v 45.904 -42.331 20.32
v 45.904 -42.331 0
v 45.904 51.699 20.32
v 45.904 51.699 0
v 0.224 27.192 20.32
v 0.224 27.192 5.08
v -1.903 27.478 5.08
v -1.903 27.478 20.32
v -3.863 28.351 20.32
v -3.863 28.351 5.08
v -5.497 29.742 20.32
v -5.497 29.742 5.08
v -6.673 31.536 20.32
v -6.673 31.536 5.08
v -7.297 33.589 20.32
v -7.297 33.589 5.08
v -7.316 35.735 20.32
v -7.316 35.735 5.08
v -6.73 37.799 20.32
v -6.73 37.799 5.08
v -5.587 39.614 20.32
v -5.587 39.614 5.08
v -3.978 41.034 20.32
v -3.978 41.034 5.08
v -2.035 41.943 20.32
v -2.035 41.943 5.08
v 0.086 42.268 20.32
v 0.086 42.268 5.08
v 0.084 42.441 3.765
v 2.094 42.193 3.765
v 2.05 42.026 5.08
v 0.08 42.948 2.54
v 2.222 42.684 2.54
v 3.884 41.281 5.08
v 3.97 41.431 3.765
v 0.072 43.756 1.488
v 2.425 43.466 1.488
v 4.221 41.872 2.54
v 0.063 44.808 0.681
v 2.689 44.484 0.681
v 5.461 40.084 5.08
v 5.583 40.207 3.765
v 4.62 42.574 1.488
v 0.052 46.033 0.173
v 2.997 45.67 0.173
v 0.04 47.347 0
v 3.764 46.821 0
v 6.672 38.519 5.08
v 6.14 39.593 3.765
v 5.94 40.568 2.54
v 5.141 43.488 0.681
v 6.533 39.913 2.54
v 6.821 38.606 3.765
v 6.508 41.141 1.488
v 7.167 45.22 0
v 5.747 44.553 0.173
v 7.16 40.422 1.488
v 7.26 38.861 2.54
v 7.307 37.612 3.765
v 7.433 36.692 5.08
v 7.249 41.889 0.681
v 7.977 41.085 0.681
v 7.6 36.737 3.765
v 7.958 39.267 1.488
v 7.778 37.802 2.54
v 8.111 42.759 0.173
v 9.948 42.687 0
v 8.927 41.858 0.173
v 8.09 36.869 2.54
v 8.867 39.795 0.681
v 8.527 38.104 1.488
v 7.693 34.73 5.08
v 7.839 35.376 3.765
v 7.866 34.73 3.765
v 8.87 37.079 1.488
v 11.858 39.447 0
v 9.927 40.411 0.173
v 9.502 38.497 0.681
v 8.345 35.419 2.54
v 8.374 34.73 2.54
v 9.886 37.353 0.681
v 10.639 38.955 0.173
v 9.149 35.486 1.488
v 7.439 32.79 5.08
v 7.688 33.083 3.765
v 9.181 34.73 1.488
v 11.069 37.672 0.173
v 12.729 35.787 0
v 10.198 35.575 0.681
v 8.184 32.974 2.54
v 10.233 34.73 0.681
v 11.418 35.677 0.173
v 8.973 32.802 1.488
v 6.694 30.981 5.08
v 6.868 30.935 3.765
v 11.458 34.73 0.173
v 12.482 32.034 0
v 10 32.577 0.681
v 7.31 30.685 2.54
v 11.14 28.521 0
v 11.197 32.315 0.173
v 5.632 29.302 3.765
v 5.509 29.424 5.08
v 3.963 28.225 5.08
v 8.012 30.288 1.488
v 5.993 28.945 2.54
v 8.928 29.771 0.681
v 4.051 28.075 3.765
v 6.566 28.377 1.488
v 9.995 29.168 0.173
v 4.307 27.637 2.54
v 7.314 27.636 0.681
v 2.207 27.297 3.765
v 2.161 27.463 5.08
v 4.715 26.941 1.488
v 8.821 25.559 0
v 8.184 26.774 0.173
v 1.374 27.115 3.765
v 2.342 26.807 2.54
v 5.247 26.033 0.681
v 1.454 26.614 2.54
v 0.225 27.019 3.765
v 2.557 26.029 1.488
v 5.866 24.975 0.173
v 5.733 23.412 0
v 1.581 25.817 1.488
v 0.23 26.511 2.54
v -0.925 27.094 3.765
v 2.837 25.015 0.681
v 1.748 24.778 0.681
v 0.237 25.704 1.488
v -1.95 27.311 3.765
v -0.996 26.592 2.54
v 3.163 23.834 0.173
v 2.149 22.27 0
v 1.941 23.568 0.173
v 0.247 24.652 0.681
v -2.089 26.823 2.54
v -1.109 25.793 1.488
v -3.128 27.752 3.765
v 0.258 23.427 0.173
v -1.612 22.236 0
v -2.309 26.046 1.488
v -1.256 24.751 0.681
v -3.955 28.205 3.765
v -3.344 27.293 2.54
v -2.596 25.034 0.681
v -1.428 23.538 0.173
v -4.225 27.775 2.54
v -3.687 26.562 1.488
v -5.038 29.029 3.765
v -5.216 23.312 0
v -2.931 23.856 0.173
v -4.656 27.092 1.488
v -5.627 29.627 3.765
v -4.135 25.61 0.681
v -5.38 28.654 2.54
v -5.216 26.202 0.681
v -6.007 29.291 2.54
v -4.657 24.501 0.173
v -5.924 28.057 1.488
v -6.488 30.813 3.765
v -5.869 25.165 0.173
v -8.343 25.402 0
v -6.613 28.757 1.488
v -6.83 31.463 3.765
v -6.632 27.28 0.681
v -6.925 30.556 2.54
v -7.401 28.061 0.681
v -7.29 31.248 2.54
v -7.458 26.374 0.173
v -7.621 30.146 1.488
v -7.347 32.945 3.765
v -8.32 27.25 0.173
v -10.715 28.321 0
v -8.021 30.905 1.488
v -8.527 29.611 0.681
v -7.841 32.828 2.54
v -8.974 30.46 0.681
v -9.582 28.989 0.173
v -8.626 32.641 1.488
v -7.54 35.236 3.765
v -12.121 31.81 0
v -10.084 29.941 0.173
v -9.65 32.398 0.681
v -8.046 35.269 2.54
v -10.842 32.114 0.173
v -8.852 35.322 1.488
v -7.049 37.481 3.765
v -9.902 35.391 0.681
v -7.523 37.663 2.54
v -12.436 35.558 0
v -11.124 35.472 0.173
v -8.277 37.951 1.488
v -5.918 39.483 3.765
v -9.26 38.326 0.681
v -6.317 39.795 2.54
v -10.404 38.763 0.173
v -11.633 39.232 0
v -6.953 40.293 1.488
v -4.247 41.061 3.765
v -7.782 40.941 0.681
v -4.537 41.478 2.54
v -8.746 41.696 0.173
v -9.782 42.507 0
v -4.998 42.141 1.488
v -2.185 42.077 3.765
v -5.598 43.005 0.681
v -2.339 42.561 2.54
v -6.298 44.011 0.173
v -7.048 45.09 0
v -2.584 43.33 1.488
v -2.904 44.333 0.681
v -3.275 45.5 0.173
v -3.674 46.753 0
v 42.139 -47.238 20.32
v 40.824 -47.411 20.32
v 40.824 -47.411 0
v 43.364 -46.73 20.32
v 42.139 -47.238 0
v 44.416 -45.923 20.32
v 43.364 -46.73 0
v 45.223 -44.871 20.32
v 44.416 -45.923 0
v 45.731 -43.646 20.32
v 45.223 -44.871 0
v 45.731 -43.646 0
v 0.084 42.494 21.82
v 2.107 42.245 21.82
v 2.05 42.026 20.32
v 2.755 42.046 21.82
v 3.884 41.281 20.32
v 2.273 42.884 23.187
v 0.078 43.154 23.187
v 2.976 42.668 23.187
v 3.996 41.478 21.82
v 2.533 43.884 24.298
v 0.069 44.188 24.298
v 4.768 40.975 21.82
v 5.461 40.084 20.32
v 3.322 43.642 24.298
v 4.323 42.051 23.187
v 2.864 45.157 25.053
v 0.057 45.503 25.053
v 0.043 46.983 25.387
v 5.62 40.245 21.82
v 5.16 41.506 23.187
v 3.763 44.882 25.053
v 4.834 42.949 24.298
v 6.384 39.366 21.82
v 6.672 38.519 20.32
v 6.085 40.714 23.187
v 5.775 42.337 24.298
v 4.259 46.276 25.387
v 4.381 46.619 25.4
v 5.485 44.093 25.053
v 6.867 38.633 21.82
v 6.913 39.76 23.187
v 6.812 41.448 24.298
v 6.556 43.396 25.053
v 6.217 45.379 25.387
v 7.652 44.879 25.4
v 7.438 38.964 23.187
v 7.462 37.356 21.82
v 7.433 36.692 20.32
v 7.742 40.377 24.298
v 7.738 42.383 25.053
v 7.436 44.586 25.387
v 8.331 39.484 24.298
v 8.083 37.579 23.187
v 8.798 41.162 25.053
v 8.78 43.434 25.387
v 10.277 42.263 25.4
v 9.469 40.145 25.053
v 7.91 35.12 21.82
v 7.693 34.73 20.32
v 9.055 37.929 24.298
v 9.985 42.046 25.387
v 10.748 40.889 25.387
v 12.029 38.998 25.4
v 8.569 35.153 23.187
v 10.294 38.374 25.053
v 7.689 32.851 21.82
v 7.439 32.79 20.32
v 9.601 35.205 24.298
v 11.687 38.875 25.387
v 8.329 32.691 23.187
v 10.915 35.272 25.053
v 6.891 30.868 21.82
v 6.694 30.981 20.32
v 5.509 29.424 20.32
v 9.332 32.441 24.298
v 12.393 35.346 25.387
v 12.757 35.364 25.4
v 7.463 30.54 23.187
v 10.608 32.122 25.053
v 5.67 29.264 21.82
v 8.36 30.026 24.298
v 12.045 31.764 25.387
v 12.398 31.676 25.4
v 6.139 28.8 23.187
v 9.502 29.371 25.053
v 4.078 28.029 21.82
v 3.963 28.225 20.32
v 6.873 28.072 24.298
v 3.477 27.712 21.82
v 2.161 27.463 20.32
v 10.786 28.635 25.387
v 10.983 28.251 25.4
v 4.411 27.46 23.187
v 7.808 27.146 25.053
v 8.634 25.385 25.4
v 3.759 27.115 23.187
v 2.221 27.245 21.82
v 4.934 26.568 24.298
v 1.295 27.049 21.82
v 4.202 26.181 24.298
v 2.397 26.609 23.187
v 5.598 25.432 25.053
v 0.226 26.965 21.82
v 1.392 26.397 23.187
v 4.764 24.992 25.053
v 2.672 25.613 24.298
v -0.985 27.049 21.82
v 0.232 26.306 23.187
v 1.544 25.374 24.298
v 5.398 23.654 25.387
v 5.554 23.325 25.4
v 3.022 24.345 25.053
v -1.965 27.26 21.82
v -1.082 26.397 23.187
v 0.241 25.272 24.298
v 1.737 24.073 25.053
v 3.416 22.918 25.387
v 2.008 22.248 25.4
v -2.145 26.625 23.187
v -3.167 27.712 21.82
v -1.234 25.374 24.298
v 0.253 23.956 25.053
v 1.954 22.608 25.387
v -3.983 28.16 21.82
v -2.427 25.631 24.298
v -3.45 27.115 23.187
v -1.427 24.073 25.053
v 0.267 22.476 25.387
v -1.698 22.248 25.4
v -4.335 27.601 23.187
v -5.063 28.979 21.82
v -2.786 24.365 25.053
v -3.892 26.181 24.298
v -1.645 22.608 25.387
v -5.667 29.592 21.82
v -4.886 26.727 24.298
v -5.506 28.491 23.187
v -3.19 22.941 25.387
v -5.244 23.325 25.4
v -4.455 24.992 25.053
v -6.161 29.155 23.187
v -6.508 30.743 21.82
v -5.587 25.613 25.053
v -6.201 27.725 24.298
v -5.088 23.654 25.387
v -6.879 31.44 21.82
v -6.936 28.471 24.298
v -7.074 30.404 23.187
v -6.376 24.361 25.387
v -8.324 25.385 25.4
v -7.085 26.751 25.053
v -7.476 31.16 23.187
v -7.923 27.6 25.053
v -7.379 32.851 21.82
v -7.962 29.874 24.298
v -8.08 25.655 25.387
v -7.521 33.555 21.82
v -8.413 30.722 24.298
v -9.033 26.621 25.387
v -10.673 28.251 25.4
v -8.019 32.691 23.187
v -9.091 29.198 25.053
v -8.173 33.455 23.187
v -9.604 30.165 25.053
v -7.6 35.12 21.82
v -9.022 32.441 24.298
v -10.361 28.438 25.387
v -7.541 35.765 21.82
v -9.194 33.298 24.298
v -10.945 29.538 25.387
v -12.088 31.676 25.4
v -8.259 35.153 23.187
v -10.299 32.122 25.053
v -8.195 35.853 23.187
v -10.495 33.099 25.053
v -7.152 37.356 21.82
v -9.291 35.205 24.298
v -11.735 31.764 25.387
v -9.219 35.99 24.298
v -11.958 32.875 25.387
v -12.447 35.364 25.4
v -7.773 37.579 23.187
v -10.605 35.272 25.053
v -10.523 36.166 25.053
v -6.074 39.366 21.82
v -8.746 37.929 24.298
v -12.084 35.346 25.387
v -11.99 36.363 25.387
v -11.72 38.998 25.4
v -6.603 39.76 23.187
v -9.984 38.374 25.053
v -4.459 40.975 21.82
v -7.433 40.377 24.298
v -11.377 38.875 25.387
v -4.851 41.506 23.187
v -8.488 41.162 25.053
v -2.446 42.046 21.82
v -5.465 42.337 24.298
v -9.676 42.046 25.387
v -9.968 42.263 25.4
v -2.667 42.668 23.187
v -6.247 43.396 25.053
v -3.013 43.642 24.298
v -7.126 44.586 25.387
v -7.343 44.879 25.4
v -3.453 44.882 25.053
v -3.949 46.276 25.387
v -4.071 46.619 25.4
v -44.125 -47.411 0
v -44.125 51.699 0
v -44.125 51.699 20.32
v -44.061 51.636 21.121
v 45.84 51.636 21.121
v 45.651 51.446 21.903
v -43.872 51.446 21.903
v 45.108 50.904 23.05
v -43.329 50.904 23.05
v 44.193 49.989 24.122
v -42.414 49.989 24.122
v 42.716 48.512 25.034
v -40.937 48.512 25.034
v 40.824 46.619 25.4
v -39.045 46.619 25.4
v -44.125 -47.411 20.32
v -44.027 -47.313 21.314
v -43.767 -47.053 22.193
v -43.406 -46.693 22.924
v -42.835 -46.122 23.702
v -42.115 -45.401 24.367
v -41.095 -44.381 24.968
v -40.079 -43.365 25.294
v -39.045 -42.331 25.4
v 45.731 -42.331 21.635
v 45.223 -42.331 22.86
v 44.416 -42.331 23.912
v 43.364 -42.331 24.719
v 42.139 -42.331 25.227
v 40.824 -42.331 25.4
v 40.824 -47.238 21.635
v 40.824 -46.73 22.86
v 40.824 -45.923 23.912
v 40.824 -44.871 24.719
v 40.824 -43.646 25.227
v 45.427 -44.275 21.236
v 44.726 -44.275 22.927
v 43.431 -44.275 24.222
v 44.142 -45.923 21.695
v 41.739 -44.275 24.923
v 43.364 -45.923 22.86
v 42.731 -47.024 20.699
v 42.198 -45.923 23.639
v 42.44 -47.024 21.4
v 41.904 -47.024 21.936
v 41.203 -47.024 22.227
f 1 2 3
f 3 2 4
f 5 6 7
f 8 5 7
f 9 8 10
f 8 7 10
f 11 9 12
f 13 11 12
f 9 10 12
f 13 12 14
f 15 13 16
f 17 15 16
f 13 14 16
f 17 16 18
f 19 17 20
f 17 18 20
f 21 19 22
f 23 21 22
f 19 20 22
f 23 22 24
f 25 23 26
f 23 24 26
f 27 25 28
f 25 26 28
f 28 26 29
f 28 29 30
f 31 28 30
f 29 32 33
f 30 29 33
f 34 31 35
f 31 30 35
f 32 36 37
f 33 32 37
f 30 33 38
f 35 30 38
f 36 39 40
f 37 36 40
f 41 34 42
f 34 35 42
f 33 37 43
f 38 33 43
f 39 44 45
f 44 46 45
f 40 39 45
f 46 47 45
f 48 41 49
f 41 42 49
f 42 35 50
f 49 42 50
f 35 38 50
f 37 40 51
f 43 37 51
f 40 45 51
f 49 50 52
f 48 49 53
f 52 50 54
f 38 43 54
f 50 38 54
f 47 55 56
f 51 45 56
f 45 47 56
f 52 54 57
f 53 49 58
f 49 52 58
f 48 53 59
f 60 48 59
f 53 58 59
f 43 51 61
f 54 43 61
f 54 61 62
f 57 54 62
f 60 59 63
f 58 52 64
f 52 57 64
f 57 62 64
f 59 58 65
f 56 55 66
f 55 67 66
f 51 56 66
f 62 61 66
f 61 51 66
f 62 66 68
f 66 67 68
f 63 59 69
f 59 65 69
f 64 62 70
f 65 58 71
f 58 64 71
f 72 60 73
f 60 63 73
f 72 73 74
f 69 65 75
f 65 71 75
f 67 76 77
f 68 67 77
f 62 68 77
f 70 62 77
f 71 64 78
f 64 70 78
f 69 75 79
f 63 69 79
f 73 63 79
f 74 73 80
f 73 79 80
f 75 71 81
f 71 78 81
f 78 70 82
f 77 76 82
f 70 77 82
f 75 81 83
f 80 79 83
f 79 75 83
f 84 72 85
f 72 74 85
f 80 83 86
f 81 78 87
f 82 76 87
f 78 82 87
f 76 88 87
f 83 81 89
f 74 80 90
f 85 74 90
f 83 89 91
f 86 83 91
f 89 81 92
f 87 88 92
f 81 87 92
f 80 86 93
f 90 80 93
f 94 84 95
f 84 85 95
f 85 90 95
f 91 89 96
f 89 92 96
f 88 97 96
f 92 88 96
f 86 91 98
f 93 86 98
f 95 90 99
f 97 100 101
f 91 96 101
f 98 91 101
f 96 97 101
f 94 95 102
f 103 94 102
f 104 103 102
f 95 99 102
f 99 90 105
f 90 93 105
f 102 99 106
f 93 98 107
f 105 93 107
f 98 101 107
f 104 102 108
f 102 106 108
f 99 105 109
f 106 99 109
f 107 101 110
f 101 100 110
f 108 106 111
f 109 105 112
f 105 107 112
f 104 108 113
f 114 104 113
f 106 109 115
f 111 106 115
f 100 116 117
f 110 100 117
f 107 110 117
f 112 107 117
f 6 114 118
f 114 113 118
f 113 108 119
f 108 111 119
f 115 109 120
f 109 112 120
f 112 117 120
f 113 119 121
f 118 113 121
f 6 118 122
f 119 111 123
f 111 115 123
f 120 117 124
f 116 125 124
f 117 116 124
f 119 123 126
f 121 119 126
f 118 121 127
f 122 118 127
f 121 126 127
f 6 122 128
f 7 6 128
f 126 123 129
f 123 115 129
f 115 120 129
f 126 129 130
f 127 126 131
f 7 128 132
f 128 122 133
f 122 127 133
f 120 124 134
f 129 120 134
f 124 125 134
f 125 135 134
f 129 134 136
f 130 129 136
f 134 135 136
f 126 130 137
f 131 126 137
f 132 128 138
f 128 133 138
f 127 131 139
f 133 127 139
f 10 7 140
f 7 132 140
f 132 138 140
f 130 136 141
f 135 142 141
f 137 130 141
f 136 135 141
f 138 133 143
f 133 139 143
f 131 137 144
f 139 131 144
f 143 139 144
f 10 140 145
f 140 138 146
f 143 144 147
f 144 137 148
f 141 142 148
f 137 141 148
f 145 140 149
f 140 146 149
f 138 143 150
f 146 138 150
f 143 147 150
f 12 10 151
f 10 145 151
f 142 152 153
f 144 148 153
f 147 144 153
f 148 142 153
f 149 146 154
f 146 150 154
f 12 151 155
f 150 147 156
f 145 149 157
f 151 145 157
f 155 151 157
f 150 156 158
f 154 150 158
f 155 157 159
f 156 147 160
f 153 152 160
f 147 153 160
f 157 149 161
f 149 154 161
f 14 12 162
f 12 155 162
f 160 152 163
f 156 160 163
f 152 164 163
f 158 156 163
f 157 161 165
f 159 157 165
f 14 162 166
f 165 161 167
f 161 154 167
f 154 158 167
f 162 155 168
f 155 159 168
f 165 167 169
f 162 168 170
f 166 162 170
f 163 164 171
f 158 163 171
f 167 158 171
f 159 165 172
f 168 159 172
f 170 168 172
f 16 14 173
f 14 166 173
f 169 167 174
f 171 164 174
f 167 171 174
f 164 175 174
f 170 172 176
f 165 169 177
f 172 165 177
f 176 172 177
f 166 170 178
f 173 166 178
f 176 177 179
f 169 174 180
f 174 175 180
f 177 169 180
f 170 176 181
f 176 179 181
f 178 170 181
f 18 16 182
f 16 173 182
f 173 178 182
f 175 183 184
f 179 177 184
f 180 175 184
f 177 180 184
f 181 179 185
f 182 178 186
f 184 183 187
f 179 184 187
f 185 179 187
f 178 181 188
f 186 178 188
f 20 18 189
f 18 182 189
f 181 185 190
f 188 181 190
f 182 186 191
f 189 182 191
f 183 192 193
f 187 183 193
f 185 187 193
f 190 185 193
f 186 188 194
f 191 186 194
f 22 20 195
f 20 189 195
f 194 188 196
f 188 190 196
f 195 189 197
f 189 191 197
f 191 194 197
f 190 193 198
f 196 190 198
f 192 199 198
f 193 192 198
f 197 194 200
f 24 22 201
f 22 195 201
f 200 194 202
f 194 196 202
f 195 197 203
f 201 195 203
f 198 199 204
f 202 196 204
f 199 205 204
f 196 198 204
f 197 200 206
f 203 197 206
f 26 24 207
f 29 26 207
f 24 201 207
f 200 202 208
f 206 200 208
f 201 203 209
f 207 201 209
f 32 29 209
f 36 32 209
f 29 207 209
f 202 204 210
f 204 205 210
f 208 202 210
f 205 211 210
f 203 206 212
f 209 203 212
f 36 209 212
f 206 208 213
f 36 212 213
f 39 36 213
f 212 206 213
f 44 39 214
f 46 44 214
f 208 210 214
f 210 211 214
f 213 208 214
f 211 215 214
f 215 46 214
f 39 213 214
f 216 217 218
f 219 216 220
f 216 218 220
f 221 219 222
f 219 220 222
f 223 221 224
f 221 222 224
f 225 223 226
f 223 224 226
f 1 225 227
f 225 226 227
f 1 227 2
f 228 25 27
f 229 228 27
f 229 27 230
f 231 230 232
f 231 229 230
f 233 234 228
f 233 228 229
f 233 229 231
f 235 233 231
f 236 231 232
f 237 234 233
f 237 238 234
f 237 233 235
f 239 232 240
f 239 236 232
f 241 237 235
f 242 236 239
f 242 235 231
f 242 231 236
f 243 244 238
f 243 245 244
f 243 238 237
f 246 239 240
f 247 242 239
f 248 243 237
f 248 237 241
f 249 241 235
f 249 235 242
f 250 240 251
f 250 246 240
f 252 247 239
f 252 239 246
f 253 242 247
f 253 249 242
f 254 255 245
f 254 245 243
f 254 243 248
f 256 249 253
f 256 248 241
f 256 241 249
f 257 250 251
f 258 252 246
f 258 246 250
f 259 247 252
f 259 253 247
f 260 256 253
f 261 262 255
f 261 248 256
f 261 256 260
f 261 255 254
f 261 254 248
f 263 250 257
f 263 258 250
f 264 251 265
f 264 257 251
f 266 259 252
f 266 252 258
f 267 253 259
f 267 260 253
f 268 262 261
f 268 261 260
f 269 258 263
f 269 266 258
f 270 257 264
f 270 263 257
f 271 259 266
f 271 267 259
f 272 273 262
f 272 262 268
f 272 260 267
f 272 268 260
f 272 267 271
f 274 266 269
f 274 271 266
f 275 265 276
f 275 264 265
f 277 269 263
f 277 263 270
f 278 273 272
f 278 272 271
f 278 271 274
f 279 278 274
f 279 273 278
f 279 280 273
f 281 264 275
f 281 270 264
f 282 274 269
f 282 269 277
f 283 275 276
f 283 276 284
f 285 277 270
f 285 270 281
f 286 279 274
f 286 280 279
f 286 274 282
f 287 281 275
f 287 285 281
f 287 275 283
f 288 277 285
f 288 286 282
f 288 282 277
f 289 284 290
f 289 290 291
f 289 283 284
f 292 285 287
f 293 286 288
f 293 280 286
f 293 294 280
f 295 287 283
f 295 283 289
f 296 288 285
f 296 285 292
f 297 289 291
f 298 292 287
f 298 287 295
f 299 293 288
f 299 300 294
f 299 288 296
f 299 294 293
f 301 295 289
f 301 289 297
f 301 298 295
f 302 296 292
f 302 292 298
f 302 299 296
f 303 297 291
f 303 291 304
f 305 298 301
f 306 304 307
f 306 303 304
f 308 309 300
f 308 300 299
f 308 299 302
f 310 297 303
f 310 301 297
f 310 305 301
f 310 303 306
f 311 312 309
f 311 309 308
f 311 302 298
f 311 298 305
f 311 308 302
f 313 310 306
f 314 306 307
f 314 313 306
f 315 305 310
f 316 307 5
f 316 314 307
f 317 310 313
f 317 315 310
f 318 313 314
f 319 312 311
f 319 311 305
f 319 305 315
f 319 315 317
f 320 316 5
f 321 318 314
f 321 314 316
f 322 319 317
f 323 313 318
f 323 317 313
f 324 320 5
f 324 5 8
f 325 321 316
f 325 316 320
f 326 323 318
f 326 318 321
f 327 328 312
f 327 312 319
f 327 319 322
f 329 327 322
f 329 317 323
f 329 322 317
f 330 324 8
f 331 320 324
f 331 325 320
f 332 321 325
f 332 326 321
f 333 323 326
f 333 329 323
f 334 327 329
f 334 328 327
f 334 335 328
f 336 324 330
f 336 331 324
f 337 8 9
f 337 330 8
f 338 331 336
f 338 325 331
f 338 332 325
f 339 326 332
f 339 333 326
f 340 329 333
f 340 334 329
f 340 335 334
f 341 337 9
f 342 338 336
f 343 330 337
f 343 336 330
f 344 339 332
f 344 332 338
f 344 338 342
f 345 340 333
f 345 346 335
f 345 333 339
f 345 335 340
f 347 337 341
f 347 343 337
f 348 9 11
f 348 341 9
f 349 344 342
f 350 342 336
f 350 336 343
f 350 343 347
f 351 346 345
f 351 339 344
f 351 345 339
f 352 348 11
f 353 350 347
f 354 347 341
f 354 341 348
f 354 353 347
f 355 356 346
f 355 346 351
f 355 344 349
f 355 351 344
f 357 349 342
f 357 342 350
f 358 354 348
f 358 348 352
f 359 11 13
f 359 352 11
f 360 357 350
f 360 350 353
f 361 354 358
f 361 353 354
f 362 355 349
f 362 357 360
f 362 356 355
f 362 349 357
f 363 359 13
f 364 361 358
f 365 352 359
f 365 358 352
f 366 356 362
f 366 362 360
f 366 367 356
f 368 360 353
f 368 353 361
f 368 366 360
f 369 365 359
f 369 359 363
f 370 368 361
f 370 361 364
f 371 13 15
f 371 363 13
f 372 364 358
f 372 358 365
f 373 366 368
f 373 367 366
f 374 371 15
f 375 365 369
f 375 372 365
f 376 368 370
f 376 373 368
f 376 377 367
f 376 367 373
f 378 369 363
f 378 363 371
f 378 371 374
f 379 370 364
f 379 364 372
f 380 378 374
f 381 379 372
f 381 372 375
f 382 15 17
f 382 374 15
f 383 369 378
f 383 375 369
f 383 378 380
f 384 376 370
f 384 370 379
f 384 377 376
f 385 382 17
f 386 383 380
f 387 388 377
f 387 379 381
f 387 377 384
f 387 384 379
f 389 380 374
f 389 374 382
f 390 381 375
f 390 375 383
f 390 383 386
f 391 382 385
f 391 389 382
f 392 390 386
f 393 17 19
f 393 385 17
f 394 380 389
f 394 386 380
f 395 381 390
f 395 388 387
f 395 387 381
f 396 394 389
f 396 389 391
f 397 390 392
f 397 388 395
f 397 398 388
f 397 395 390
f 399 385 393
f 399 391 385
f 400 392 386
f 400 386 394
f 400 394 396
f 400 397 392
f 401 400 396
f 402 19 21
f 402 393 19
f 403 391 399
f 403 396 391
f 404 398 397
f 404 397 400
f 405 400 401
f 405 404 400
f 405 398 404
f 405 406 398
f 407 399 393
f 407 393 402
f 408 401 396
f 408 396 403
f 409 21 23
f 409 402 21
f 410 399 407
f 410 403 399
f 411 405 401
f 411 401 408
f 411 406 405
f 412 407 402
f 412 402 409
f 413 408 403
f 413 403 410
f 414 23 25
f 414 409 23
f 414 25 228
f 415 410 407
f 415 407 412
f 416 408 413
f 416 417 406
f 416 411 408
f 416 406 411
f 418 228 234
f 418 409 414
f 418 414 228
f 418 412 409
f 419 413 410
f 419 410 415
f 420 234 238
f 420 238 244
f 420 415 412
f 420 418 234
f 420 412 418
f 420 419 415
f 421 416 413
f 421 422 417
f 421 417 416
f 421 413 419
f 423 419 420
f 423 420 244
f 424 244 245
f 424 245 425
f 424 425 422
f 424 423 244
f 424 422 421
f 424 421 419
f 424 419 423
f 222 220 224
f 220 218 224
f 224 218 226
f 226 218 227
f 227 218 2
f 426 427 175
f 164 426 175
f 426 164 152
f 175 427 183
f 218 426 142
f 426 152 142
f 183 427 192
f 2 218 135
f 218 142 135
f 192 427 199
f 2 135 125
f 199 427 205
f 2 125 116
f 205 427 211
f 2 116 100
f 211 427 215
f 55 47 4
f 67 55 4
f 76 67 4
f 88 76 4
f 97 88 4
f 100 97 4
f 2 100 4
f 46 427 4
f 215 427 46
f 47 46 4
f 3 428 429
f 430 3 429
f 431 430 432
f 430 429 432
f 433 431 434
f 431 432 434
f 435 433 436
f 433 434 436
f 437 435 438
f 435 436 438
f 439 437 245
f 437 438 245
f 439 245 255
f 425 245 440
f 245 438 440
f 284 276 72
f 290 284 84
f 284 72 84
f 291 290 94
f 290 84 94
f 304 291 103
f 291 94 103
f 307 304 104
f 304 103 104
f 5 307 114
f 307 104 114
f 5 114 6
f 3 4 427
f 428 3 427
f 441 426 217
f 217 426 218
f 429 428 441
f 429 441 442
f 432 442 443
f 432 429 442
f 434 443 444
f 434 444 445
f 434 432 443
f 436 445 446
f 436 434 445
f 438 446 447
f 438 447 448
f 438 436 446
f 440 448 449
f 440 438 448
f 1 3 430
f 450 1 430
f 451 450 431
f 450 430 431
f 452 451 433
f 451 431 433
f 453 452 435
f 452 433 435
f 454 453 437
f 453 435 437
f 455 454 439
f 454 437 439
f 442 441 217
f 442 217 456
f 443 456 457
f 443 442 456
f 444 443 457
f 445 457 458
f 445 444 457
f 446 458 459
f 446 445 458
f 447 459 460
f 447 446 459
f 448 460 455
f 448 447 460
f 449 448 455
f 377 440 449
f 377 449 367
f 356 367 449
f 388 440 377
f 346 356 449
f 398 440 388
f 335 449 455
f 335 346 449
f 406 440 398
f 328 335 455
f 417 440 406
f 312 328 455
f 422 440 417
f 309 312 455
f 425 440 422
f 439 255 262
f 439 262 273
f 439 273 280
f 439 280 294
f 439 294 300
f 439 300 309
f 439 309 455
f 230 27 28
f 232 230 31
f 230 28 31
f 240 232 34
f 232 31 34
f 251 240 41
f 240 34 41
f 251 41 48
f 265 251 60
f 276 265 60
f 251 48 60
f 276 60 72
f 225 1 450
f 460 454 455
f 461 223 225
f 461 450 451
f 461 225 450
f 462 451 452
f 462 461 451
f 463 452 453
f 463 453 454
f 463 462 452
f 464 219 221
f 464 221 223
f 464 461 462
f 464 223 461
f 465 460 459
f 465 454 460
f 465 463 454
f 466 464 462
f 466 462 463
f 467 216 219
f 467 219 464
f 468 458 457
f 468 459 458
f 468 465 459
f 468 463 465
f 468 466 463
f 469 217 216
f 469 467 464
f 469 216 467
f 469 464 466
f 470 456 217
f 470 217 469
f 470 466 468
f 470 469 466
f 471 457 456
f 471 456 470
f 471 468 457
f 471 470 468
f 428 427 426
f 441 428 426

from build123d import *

# Parameters (mm, degrees)
F1_DEPTH     = 25.4
F2_T1_DEPTH  = 97.6486100805
F2_T3_DEPTH  = 106.7304394197
F2_T5_DEPTH  = 33.02
F2_T7_DEPTH  = 115.4286100805
F2_T9_DEPTH  = 124.5104394197
F2_S13_W     = 5.08
F2_S13_H     = 5.08
F2_T14_DEPTH = 5.08


# Not quite as in the source:
# - a fillet or chamfer that OpenCascade refuses, or shapes differently, is made with other operations: its cross-section is extruded or revolved along the edge and cut away or added


with BuildPart() as f1:
    # F0 (on Top) → F1 (new body)
    with BuildSketch(Plane.XY):
        with BuildLine():
            Line((0, 51.6993701458), (-44.1247820854, 51.6993701458))
            Line((-44.1247820854, 51.6993701458), (-44.1247820854, -47.4110692739))
            Line((-44.1247820854, -47.4110692739), (0.8895229548, -47.4110692739))
            Line((0.8895229548, -47.4110692739), (0.8895229548, -45.8316206932))
            Line((0.8895229548, -45.8316206932), (0.223518183, 27.1919083226))
            ThreePointArc((0.223518183, 27.1919083226), (-7.3831209657, 34.6610501168), (0.0860208286, 42.2676892655))
            Line((0.0860208286, 42.2676892655), (0, 51.6993701458))
        make_face()
        with BuildLine():
            Line((45.9038279951, 51.6993701458), (0, 51.6993701458))
            Line((0, 51.6993701458), (0.0860208286, 42.2676892655))
            ThreePointArc((0.0860208286, 42.2676892655), (5.4607226524, 40.0843651019), (7.6929734789, 34.729798794))
            ThreePointArc((7.6929734789, 34.729798794), (5.5093358137, 29.4238456474), (0.223518183, 27.1919083226))
            Line((0.223518183, 27.1919083226), (0.8895229548, -45.8316206932))
            Line((0.8895229548, -45.8316206932), (0.8895229548, -47.4110692739))
            Line((0.8895229548, -47.4110692739), (45.9038279951, -47.4110692739))
            Line((45.9038279951, -47.4110692739), (45.9038279951, 51.6993701458))
        make_face()
    extrude(amount=F1_DEPTH)

    # F2: fillet of radius 5.08 on 8 edges, made by hand

    # F2_s2 → F2_t1 (cut)
    with BuildSketch(Plane.YZ.offset(-56.8247820854)):
        with BuildLine():
            ThreePointArc((-47.4110692739, 20.32), (-45.9231717224, 23.9121024484), (-42.3310692739, 25.4))
            Line((-42.3310692739, 25.4), (-47.4110692739, 25.4))
            Line((-47.4110692739, 25.4), (-47.4110692739, 20.32))
        make_face()
    extrude(amount=F2_T1_DEPTH, mode=Mode.SUBTRACT)

    # F2_s4 → F2_t3 (cut)
    with BuildSketch(Plane.XZ.offset(-64.3993701458)):
        with BuildLine():
            ThreePointArc((45.9038279951, 20.32), (44.4159304435, 23.9121024484), (40.8238279951, 25.4))
            Line((40.8238279951, 25.4), (45.9038279951, 25.4))
            Line((45.9038279951, 25.4), (45.9038279951, 20.32))
        make_face()
    extrude(amount=F2_T3_DEPTH, mode=Mode.SUBTRACT)

    # F2_s6 → F2_t5 (cut)
    with BuildSketch(Plane.XY.offset(-12.7)):
        with BuildLine():
            ThreePointArc((40.8238279951, -47.4110692739), (44.4159304435, -45.9231717224), (45.9038279951, -42.3310692739))
            Line((45.9038279951, -42.3310692739), (45.9038279951, -47.4110692739))
            Line((45.9038279951, -47.4110692739), (40.8238279951, -47.4110692739))
        make_face()
    extrude(amount=F2_T5_DEPTH, mode=Mode.SUBTRACT)

    # F2_s8 → F2_t7 (cut)
    with BuildSketch(Plane.YZ.offset(-56.8247820854)):
        with BuildLine():
            ThreePointArc((51.6993701458, 20.32), (50.2114725942, 23.9121024484), (46.6193701458, 25.4))
            Line((46.6193701458, 25.4), (51.6993701458, 25.4))
            Line((51.6993701458, 25.4), (51.6993701458, 20.32))
        make_face()
    extrude(amount=F2_T7_DEPTH, mode=Mode.SUBTRACT)

    # F2_s10 → F2_t9 (cut)
    with BuildSketch(Plane.XZ.offset(-64.3993701458)):
        with BuildLine():
            ThreePointArc((-44.1247820854, 20.32), (-42.6368845338, 23.9121024484), (-39.0447820854, 25.4))
            Line((-39.0447820854, 25.4), (-44.1247820854, 25.4))
            Line((-44.1247820854, 25.4), (-44.1247820854, 20.32))
        make_face()
    extrude(amount=F2_T9_DEPTH, mode=Mode.SUBTRACT)


with BuildPart() as f2_tool12:
    # F2_s13 → F2_t14 (new body)
    with BuildSketch(Plane.XZ.offset(42.3310692739)):
        with Locations((43.3638279951, 22.86)):
            Rectangle(F2_S13_W, F2_S13_H)
    extrude(amount=F2_T14_DEPTH)

    # F2_s15 → F2_t16 (revolve, cut)
    with BuildSketch(Plane(origin=(40.8238279951, -42.3310692739, 20.32), x_dir=(-0.7071067812, 0, -0.7071067812), z_dir=(-0.7071067812, 0, 0.7071067812))):
        with BuildLine():
            ThreePointArc((0, -5.08), (5.08, 0), (0, 5.08))
            Line((0, 5.08), (0, -5.08))
        make_face()
    revolve(axis=Axis((40.8238279951, -42.3310692739, 20.32), (0, -1, 0)), mode=Mode.SUBTRACT)


with BuildPart() as f1_1:
    add(f1.part)

    # F2_t11: cut F2_tool12
    add(f2_tool12.part, mode=Mode.SUBTRACT)

    # F2_s17 → F2_t18 (revolve, cut)
    with BuildSketch(Plane(origin=(0.4714804091, 0.0043000962, 0), x_dir=(0, 0, 1), z_dir=(-0.9999584116, -0.0091200341, 0))):
        with BuildLine():
            ThreePointArc((20.32, 42.265146908), (23.9121024484, 43.7530444596), (25.4, 47.345146908))
            Line((25.4, 47.345146908), (25.4, 42.265146908))
            Line((25.4, 42.265146908), (20.32, 42.265146908))
        make_face()
    revolve(axis=Axis((0.1547695058, 34.729798794, 25.4), (0, 0, -1)), mode=Mode.SUBTRACT)

    # F2_s19 → F2_t20 (revolve, cut)
    with BuildSketch(Plane(origin=(0.4714804091, 0.0043000962, 0), x_dir=(0, 0, 1), z_dir=(-0.9999584116, -0.0091200341, 0))):
        with BuildLine():
            ThreePointArc((5.08, 42.265146908), (1.4878975516, 43.7530444596), (0, 47.345146908))
            Line((0, 47.345146908), (0, 42.265146908))
            Line((0, 42.265146908), (5.08, 42.265146908))
        make_face()
    revolve(axis=Axis((0.1547695058, 34.729798794, 0), (0, 0, -1)), mode=Mode.SUBTRACT)


solid = f1_1.part
